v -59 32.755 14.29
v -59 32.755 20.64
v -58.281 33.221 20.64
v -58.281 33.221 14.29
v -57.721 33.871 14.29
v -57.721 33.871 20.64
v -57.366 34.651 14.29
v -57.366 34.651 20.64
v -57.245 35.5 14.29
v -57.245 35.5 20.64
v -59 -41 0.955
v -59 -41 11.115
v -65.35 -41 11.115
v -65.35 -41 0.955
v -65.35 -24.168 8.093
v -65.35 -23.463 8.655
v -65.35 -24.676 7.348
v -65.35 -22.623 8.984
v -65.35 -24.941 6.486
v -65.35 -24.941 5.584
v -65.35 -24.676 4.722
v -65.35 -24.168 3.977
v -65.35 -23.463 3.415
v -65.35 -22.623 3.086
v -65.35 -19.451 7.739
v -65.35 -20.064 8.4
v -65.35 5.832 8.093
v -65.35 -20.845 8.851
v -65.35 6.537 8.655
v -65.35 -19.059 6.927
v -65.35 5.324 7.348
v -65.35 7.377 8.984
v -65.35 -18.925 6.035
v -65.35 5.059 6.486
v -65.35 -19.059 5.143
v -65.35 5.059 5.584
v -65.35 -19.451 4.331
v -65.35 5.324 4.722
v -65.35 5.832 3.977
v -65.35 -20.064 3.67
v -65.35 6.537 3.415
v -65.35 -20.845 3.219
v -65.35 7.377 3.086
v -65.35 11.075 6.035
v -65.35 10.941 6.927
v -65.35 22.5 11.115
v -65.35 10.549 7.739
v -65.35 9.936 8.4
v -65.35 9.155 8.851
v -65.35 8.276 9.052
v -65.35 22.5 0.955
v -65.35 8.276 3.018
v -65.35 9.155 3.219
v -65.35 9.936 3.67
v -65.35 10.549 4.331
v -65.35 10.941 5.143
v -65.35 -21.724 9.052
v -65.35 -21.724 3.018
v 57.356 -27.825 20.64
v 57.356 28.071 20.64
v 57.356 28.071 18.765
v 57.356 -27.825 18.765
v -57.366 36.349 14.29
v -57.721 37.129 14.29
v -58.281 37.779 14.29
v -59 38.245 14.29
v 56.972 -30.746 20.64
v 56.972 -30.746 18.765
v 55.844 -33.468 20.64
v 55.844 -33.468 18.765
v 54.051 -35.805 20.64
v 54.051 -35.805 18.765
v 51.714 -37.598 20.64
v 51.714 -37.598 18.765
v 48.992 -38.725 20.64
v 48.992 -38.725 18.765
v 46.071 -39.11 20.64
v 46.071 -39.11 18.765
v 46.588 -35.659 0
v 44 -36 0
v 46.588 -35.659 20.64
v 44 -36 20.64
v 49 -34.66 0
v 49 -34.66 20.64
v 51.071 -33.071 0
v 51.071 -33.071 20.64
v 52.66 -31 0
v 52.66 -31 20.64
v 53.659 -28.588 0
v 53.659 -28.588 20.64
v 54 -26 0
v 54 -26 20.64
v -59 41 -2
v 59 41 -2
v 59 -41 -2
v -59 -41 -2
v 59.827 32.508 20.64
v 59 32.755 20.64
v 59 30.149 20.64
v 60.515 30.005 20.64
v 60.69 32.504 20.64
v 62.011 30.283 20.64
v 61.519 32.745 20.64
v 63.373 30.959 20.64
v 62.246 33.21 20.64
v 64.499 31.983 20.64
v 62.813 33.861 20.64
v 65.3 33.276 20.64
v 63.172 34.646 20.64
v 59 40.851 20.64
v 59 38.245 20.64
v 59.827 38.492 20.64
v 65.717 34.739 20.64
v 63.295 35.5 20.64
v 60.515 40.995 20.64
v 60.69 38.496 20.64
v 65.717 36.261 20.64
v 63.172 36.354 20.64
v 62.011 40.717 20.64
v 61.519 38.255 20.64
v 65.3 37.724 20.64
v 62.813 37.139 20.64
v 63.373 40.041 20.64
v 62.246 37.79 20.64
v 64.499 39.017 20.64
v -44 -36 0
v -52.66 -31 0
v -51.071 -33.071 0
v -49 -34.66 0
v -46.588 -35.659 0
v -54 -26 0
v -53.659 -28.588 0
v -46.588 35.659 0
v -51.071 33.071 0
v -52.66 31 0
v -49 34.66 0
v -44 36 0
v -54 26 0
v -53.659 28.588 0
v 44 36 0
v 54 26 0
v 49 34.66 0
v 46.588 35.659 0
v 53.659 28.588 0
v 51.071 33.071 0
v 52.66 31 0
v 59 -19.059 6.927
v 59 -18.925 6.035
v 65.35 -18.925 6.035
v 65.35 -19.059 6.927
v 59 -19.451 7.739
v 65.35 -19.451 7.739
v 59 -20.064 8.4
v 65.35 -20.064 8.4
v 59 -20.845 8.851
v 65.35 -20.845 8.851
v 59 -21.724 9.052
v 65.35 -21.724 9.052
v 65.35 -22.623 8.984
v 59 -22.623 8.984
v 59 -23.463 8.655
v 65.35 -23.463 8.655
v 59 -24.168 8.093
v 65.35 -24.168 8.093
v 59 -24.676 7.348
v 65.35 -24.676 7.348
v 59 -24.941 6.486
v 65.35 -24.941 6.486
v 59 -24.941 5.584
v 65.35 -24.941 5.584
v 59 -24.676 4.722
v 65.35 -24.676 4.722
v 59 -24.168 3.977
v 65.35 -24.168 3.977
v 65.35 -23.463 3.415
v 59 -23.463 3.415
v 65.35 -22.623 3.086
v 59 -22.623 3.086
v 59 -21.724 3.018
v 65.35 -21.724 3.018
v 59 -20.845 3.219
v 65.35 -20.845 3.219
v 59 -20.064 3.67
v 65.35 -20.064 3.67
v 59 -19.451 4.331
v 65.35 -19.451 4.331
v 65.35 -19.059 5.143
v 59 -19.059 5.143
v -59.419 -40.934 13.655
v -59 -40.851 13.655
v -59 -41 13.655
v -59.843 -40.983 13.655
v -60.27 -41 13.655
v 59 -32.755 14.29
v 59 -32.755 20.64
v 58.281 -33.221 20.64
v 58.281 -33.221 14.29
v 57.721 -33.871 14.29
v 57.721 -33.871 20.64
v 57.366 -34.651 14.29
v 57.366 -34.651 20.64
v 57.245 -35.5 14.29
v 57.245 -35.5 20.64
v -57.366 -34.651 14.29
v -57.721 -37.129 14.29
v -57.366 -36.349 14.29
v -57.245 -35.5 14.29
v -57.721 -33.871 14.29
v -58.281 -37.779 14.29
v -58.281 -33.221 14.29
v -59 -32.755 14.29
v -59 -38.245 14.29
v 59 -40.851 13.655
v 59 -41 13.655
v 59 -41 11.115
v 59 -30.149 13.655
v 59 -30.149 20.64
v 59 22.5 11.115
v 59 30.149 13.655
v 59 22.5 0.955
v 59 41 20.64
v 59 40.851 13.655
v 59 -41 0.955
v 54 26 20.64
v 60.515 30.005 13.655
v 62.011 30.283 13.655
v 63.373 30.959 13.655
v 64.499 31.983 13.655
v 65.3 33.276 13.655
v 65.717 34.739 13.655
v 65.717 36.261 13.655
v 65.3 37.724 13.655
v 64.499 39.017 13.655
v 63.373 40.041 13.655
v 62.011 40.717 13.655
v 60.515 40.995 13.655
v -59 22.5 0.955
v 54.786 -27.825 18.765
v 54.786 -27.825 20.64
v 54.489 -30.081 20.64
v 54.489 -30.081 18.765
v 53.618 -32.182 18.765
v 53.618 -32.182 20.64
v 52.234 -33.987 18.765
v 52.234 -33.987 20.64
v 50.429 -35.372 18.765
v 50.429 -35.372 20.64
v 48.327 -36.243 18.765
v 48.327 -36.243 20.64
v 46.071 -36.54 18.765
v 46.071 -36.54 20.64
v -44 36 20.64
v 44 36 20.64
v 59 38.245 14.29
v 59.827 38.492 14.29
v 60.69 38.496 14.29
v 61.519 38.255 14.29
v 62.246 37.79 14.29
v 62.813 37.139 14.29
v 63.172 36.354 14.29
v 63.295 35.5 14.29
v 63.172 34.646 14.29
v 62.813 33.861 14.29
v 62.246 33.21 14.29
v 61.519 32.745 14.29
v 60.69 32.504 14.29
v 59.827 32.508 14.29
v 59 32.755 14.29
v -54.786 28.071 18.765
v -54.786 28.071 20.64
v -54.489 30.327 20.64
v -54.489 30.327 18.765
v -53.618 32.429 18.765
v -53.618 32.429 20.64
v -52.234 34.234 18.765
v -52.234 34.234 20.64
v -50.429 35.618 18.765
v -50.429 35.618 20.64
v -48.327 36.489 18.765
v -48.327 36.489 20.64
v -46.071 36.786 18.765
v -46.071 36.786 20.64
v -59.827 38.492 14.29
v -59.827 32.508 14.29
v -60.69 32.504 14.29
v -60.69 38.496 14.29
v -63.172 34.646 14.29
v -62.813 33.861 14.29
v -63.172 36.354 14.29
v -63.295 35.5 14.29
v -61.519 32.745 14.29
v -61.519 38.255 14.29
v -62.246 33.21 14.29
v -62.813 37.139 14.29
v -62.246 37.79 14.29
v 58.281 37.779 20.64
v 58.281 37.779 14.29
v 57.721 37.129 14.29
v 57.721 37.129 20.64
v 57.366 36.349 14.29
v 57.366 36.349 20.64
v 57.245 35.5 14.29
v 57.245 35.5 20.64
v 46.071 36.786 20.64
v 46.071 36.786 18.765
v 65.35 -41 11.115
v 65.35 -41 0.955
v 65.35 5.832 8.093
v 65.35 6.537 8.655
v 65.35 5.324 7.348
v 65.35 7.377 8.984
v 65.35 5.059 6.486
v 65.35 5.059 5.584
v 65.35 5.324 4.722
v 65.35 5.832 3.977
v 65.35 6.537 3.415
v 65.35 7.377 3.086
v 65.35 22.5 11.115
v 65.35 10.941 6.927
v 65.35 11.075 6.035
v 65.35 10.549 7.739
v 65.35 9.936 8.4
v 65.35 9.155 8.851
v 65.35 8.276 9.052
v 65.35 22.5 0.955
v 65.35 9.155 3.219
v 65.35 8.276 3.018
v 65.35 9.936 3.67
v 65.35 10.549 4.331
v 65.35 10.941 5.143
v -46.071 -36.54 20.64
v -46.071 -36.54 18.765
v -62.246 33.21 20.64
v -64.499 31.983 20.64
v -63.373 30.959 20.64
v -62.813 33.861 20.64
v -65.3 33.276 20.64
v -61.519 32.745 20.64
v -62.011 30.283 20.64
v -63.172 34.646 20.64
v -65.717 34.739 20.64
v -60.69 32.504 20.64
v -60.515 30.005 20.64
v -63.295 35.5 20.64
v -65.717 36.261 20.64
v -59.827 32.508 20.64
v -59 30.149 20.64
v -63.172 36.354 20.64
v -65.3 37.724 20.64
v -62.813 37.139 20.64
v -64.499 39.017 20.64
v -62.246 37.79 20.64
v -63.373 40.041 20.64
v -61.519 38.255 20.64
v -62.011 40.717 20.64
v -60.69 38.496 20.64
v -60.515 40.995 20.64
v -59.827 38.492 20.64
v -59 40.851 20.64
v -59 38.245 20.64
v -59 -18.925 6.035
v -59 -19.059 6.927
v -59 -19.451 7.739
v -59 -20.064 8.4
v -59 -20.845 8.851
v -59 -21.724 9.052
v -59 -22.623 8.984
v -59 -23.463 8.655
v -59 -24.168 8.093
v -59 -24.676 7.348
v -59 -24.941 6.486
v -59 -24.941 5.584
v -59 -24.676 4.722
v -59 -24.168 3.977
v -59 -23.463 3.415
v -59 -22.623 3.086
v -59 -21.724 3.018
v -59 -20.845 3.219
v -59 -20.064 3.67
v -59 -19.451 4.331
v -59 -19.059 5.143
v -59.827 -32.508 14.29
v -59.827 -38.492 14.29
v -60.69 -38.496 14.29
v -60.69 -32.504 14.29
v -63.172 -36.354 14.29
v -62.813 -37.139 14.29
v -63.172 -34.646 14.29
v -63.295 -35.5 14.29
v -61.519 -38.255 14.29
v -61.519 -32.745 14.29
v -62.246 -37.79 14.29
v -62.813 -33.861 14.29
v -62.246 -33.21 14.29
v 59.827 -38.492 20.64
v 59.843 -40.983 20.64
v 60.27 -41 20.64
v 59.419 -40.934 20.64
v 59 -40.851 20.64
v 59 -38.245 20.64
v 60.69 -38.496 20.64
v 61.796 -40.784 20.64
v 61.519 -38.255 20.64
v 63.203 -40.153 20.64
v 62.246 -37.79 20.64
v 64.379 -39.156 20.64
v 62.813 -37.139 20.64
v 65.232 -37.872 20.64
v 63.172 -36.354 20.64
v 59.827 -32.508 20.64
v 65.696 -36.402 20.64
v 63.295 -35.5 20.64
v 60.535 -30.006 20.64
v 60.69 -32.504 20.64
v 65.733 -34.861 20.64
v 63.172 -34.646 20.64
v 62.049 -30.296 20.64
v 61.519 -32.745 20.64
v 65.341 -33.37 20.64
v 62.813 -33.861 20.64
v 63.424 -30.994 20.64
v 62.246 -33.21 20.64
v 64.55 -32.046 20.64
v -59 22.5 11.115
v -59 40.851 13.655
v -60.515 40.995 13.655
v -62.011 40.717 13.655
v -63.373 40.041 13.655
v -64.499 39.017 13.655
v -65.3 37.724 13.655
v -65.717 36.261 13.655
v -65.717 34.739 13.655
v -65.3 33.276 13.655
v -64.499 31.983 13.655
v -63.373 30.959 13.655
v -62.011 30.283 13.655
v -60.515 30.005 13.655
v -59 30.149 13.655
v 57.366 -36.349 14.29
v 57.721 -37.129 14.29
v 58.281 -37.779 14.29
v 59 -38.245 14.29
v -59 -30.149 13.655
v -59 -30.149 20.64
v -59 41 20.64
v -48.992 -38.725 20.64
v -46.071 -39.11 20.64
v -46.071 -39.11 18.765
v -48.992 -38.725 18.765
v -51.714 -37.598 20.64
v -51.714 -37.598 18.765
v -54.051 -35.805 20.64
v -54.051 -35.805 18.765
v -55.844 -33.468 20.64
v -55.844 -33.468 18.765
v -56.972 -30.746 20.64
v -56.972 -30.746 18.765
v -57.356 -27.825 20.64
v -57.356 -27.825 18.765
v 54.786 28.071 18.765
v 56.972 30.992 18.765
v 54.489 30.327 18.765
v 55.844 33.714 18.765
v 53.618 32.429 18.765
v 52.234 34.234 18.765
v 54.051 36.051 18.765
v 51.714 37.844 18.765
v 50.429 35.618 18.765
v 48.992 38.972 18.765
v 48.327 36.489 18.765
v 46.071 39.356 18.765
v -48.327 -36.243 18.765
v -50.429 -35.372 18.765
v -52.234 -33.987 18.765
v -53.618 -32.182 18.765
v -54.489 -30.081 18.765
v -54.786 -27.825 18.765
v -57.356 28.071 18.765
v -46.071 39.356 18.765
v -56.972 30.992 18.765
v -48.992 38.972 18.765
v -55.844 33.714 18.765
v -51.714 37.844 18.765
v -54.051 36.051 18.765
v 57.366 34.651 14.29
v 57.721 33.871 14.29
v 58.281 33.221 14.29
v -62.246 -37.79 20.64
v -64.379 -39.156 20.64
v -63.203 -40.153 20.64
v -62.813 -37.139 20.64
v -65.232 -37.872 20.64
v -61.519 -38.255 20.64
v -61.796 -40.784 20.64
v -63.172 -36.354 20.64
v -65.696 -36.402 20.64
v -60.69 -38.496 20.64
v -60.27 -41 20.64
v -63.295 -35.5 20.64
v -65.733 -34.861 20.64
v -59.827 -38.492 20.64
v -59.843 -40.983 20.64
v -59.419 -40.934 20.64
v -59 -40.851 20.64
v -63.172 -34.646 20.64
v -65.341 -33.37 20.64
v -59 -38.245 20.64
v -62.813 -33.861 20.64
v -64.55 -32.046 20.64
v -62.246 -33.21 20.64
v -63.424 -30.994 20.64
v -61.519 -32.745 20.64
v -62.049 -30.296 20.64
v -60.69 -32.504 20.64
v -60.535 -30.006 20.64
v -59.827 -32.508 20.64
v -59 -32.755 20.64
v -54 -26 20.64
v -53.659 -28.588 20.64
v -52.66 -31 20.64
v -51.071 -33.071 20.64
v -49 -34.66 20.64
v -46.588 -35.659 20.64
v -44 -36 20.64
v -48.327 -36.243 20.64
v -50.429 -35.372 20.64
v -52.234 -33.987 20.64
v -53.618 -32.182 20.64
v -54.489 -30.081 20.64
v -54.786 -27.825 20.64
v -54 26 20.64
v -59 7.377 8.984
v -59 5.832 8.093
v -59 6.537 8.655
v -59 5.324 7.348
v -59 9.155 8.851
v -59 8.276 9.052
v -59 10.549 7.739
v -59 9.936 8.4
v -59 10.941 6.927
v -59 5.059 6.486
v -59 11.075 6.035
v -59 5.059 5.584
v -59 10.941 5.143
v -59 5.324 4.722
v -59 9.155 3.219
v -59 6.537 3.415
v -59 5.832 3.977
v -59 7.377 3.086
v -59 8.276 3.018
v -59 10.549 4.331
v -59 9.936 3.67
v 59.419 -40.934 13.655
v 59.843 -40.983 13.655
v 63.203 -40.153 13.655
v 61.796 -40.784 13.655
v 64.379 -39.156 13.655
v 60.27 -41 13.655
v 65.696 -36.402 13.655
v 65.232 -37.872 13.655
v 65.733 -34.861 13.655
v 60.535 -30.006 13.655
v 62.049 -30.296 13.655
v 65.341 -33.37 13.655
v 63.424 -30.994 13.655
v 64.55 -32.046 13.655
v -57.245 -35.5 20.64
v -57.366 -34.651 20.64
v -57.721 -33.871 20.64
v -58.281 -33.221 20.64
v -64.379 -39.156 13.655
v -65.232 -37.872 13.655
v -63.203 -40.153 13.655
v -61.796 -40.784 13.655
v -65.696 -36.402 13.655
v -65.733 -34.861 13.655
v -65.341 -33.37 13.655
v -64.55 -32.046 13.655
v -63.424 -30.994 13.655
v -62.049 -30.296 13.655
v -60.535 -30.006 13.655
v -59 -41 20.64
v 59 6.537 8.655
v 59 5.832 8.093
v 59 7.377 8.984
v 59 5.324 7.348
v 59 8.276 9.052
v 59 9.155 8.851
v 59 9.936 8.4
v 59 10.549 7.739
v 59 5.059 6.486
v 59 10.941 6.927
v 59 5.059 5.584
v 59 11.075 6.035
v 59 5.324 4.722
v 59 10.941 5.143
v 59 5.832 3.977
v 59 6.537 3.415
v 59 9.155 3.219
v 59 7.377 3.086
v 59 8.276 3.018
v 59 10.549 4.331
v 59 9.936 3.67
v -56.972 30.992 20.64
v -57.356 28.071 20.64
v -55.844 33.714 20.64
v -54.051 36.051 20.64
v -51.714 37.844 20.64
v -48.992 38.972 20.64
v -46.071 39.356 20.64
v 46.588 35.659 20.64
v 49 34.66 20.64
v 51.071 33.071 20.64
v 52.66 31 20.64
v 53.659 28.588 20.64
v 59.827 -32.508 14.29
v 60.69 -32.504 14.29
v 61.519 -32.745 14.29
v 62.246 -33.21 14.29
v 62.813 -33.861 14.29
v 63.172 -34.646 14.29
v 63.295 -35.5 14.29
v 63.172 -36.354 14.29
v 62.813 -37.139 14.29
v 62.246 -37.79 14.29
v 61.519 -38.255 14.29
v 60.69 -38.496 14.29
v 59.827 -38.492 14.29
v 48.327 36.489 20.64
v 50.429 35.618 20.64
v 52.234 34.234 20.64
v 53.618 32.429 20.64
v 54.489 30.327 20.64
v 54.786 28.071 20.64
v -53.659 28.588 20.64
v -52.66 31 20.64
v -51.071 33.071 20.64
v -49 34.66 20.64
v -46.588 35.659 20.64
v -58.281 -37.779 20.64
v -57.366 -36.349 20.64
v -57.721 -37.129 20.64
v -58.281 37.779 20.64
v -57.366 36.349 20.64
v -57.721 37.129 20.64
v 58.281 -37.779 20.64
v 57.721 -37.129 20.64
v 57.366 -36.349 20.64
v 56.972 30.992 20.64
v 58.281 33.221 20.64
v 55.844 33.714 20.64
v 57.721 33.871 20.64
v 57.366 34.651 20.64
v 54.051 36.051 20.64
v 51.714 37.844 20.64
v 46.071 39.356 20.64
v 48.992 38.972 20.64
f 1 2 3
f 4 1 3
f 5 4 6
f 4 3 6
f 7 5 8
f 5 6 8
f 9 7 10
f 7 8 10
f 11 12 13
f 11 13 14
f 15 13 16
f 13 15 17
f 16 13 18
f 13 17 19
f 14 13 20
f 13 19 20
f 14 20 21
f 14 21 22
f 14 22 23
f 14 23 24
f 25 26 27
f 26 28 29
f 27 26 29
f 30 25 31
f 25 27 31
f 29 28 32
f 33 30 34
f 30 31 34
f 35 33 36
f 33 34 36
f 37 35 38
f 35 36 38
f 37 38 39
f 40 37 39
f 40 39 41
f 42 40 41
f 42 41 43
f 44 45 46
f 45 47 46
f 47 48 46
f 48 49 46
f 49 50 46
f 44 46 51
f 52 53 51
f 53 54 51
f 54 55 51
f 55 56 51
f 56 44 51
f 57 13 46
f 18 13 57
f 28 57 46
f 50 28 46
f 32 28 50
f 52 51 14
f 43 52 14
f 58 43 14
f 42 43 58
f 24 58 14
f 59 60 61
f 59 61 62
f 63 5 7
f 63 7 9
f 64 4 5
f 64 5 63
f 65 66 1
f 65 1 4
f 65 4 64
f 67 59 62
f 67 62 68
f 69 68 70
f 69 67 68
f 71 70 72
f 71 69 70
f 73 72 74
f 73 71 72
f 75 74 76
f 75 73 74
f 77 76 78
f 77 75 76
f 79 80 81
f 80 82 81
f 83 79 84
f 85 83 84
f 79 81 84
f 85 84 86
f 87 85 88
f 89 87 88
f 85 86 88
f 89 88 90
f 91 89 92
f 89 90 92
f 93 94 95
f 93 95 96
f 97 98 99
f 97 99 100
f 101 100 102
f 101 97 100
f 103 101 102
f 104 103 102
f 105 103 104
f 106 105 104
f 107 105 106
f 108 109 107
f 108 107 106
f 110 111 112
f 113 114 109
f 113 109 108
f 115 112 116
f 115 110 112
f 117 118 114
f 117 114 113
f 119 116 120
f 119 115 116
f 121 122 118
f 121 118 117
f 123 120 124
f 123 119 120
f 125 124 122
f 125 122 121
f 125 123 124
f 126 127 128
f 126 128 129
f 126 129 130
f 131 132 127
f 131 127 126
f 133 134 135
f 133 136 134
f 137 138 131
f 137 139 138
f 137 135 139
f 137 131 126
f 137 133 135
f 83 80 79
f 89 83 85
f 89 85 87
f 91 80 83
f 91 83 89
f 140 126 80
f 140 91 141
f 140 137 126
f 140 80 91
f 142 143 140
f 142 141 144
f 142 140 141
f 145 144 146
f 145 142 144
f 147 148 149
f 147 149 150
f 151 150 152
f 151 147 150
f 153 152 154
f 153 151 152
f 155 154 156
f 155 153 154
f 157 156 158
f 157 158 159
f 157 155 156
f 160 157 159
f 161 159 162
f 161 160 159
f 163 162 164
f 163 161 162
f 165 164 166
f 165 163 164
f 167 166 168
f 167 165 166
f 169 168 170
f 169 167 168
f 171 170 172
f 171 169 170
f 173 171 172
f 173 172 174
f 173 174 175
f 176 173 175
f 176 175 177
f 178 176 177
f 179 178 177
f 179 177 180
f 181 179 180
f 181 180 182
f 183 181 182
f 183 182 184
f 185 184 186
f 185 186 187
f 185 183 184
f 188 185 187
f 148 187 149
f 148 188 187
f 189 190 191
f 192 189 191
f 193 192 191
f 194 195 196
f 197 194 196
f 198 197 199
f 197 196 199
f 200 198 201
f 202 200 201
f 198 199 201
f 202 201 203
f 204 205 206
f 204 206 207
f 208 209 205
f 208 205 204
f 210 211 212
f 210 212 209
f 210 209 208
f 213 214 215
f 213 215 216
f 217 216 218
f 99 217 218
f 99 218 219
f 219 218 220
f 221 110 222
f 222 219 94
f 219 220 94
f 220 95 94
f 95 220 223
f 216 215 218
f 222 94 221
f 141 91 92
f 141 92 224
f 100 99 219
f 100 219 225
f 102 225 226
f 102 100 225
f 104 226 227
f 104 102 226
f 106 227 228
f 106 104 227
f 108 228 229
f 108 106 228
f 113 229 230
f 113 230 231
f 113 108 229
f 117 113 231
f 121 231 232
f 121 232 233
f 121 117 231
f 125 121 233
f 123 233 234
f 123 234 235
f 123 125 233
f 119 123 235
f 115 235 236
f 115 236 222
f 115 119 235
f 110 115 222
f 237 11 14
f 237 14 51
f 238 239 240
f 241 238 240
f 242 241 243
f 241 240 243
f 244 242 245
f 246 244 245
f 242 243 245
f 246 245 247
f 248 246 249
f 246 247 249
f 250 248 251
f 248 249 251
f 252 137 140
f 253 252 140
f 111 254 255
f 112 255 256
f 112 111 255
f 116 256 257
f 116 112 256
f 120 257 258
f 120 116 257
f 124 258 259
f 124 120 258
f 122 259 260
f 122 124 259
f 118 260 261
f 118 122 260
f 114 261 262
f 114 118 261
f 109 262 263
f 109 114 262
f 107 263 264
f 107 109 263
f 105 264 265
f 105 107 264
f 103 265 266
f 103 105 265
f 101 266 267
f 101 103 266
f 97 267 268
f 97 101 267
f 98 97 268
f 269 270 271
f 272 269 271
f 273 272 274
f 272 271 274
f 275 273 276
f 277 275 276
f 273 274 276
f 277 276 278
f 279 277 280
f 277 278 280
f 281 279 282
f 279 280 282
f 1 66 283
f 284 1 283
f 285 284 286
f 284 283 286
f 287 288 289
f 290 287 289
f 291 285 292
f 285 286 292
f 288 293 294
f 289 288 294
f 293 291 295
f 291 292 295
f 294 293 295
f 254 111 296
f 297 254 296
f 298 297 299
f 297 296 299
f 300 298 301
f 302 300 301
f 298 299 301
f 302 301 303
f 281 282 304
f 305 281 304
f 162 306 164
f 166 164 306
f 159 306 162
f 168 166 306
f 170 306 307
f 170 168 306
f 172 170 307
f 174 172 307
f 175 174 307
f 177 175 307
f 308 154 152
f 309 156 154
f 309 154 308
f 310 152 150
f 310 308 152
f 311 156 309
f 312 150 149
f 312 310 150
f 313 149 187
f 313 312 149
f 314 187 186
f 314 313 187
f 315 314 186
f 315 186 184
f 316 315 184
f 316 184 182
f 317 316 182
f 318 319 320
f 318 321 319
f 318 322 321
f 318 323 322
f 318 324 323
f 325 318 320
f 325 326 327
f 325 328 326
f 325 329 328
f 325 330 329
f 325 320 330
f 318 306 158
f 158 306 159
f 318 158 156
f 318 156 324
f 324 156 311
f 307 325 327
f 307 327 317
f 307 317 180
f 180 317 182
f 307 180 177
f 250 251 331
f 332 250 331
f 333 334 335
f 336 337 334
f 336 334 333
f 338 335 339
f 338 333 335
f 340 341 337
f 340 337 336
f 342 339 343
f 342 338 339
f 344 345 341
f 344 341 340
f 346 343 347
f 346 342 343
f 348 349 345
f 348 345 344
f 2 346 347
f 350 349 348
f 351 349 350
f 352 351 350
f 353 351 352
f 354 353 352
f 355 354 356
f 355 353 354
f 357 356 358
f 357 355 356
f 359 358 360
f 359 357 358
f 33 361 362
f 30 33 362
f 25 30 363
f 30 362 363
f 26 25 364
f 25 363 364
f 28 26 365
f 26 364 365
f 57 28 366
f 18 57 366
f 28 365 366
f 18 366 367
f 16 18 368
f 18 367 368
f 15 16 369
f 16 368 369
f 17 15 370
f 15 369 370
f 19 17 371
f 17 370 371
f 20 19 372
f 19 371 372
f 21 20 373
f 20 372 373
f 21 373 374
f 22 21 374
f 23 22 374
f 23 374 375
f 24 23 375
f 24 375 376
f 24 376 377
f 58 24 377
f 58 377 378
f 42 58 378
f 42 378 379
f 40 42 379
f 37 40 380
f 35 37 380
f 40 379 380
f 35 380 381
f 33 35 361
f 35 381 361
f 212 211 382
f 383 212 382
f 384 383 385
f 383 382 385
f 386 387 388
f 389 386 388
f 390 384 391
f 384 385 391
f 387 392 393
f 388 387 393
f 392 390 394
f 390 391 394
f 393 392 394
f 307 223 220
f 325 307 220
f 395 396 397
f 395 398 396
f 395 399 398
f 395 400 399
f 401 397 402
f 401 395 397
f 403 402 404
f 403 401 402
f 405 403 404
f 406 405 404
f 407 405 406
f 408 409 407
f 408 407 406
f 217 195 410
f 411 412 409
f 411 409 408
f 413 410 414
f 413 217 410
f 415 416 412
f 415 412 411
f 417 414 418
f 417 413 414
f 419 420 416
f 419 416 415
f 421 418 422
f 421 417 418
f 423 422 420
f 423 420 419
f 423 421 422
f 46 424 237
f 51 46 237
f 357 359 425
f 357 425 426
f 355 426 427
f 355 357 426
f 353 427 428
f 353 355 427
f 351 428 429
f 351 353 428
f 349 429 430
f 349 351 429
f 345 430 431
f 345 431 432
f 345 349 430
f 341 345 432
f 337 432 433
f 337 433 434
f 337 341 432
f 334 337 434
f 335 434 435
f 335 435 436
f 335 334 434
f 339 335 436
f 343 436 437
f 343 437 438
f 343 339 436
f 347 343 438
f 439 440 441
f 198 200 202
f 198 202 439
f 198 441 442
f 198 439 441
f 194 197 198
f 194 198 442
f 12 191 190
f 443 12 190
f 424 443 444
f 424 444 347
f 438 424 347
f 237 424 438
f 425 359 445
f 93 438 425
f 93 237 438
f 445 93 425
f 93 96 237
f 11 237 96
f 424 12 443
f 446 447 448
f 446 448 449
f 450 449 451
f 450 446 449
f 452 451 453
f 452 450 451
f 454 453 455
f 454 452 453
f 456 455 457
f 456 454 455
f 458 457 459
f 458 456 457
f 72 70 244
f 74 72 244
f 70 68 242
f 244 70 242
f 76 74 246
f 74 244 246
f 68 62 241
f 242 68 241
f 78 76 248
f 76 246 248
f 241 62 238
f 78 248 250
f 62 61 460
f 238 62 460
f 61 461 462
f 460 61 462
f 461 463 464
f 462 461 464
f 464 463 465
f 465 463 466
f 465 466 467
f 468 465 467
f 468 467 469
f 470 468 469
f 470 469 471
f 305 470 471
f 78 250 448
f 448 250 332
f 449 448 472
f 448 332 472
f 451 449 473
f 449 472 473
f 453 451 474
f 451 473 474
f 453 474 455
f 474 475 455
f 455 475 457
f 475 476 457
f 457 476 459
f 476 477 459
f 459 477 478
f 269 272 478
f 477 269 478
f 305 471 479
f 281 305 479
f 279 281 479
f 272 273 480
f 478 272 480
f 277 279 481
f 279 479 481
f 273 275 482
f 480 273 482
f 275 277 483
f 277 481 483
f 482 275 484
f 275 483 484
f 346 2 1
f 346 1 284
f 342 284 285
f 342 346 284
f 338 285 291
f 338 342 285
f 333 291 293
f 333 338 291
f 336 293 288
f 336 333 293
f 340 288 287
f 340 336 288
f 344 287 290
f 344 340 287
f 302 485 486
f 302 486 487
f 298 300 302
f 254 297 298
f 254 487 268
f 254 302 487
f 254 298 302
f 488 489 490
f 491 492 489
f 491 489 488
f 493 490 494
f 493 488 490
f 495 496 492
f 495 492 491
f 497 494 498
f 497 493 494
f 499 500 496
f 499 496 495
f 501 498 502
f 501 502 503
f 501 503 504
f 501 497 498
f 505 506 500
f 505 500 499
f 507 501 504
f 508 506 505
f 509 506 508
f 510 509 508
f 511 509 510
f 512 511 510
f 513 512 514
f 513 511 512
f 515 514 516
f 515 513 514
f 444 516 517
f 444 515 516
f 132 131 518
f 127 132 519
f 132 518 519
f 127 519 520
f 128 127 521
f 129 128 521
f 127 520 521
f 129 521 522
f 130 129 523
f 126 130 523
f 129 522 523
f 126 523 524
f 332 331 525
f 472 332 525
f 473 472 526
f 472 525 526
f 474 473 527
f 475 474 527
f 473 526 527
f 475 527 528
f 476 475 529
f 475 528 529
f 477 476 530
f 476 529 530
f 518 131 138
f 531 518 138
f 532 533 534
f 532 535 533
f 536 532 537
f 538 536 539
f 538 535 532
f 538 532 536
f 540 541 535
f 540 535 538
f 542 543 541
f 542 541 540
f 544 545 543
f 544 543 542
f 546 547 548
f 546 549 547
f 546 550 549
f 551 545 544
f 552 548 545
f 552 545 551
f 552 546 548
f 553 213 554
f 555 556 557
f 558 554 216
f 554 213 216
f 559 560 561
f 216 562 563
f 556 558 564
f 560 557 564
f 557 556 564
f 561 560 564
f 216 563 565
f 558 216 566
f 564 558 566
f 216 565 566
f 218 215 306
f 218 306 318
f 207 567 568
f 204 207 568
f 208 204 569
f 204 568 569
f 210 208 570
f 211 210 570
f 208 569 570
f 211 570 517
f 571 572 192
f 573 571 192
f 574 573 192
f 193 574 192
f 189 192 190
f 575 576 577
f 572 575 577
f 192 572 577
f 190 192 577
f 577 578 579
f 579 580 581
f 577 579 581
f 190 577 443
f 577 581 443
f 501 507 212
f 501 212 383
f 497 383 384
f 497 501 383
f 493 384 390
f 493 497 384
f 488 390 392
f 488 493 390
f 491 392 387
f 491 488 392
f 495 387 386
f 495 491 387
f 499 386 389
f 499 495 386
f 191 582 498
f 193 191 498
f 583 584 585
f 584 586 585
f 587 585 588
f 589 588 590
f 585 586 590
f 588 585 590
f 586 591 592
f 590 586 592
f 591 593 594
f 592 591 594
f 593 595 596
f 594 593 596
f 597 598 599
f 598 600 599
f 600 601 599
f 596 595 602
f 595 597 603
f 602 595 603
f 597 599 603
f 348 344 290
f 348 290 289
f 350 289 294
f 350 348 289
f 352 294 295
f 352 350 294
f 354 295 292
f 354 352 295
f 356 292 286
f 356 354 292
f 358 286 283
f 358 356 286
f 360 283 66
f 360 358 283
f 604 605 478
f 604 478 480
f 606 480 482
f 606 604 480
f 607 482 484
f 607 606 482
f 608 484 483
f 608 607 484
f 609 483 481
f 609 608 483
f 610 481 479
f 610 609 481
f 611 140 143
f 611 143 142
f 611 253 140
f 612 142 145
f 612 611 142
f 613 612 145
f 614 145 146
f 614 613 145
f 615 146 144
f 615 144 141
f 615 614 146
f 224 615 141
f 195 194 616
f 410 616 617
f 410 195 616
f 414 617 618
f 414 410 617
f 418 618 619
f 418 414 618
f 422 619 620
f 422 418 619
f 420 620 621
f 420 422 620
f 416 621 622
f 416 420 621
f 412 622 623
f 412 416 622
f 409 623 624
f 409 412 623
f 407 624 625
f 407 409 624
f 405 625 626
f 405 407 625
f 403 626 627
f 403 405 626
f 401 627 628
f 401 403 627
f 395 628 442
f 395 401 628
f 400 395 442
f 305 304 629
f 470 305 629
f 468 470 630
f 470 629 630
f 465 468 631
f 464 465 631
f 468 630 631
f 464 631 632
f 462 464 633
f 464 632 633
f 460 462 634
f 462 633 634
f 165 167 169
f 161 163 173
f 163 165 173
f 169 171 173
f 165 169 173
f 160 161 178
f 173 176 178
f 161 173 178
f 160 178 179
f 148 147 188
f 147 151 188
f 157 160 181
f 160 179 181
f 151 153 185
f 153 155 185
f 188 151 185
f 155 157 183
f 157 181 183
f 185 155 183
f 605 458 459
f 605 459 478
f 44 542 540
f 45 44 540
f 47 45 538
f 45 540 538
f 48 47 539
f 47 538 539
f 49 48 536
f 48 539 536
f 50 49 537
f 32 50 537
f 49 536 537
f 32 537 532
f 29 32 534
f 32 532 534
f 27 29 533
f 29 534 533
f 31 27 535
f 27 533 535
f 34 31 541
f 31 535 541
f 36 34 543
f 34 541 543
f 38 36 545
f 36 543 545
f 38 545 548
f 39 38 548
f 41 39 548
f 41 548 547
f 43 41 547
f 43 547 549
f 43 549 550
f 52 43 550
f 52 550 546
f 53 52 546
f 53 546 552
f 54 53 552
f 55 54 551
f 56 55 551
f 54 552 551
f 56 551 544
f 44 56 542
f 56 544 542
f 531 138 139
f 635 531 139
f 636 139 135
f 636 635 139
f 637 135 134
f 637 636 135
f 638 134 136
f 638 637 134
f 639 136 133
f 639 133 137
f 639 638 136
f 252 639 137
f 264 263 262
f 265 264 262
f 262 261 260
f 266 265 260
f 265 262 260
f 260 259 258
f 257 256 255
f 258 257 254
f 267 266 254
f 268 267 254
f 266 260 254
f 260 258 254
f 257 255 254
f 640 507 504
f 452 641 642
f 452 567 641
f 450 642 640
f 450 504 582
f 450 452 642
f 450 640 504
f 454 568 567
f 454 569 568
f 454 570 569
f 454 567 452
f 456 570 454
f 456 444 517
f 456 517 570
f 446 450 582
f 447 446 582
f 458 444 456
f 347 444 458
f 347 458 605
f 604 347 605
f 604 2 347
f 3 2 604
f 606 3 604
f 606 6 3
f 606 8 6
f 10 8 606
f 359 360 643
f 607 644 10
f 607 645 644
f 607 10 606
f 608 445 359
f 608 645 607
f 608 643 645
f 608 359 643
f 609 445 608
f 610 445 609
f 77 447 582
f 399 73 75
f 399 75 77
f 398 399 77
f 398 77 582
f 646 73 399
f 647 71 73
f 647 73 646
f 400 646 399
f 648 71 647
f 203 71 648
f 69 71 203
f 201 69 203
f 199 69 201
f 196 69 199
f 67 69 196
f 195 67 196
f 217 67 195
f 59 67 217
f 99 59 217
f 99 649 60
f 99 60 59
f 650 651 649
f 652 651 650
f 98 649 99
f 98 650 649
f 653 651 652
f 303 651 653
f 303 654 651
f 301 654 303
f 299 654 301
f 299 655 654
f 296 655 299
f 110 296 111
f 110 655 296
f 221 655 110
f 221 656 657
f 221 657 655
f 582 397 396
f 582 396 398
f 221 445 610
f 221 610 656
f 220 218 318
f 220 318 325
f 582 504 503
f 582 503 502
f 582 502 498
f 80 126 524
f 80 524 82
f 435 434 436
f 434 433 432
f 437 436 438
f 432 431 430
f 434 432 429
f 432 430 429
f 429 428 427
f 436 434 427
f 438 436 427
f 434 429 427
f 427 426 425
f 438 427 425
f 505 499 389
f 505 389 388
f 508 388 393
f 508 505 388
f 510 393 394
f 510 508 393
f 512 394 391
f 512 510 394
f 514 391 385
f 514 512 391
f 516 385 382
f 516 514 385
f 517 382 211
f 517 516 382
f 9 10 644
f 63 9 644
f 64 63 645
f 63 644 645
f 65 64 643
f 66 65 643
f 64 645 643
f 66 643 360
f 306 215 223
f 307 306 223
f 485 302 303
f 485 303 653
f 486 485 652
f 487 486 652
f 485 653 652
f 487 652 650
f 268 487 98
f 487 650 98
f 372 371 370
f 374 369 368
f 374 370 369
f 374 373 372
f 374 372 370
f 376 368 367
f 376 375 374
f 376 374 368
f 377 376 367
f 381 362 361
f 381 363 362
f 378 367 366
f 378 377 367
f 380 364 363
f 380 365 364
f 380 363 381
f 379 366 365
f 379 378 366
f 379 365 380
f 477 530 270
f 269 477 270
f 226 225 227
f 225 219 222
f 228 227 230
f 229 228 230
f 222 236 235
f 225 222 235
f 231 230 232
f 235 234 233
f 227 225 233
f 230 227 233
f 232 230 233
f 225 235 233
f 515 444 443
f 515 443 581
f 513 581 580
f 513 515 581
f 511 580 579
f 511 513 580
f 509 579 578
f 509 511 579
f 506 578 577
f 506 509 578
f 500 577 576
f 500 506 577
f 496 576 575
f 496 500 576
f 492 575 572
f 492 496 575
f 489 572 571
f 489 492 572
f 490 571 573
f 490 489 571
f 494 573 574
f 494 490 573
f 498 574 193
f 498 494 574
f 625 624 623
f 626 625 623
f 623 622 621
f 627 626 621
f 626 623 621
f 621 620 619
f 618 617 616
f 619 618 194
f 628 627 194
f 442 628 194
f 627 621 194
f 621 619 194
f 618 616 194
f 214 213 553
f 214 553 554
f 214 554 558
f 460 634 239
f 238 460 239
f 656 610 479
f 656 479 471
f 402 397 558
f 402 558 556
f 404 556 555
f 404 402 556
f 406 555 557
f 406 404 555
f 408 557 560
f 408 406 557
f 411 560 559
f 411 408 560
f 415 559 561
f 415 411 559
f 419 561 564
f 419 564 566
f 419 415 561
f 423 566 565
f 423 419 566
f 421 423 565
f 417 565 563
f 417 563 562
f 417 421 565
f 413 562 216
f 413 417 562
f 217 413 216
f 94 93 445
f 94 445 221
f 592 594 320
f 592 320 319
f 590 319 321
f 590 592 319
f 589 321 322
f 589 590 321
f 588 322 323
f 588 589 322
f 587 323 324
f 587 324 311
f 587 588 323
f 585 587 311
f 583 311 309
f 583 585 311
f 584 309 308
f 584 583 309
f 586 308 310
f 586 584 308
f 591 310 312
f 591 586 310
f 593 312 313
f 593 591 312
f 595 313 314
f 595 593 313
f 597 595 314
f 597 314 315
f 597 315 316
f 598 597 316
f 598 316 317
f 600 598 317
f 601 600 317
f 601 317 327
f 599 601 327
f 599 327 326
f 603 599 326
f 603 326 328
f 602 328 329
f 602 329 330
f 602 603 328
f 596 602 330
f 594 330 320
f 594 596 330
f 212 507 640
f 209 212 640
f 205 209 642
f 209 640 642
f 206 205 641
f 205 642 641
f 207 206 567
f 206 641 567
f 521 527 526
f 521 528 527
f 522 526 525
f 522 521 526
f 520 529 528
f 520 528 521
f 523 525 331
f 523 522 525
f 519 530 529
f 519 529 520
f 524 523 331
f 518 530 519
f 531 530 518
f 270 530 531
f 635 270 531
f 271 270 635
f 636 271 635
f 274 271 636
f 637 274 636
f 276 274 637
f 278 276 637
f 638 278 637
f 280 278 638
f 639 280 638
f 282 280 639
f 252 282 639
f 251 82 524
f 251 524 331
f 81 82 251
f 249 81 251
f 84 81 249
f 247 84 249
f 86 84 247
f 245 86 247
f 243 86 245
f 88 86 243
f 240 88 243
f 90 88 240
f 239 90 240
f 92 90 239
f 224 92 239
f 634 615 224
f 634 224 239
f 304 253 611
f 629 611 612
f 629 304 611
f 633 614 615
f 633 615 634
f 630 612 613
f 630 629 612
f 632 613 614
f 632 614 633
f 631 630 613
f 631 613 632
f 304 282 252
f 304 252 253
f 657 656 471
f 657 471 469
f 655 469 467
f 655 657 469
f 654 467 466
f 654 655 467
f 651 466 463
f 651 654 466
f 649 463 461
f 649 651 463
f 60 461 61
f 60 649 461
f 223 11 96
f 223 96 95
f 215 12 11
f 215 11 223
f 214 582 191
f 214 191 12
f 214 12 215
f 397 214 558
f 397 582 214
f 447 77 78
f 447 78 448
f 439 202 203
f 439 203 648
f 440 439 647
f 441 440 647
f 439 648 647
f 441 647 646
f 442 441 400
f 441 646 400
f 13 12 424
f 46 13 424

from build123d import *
from build123d.topology import SkipClean

# Parameters (mm, degrees)
SKETCH2_W           = 108
SKETCH2_H           = 72
BOSS_EXTRUDE1_DEPTH = 20.64
SHELL1_T            = 5
SKETCH3_W           = 118
SKETCH3_H           = 82
CUT_EXTRUDE1_DEPTH  = 3
FILLET1_R           = 10
BOSS_EXTRUDE2_DEPTH = 6.985
SKETCH6_4_R         = 3.025
CUT_EXTRUDE4_DEPTH  = 6.35
CUT_EXTRUDE2_DEPTH  = 1.875
SKETCH14_W          = 10.16
SKETCH14_H          = 63.5
SKETCH14_R          = 3.02514
BOSS_EXTRUDE5_DEPTH = 6.35


with BuildPart() as part:
    # Sketch2 → Boss-Extrude1 (new body)
    with BuildSketch(Plane.XY):
        Rectangle(SKETCH2_W, SKETCH2_H)
    extrude(amount=BOSS_EXTRUDE1_DEPTH)

    # Shell1
    shell1_openings = [part.faces().sort_by_distance(p)[0] for p in [
        (0, 0, 20.64),
    ]]
    offset(amount=SHELL1_T, openings=shell1_openings, kind=Kind.INTERSECTION)

    # Sketch3 → Cut-Extrude1 (cut)
    with BuildSketch(Plane(origin=(0, 0, -5), x_dir=(-1, 0, 0), z_dir=(0, 0, -1))):
        Rectangle(SKETCH3_W, SKETCH3_H)
    extrude(amount=-CUT_EXTRUDE1_DEPTH, mode=Mode.SUBTRACT)

    # Fillet1
    fillet1_edges = [part.edges().sort_by_distance(p)[0] for p in [
        (54, -36, 10.32),
        (-54, -36, 10.32),
        (54, 36, 10.32),
        (-54, 36, 10.32),
    ]]
    fillet(fillet1_edges, radius=FILLET1_R)

    # Sketch6 → Boss-Extrude2 (add)
    with BuildSketch(Plane.XY.offset(20.64)):
        with BuildLine():
            ThreePointArc((59, 30.148635688), (65.77, 35.5), (59, 40.851364312))
            Line((59, 40.851364312), (59, 30.148635688))
        make_face()
        with BuildLine():
            Line((59, -41), (60.27, -41))
            ThreePointArc((60.27, -41), (65.732714697, -34.86066586), (59, -30.148635688))
            Line((59, -30.148635688), (59, -32.754508241))
            ThreePointArc((59, -32.754508241), (57.245, -35.5), (59, -38.245491759))
            Line((59, -38.245491759), (59, -41))
        make_face()
        with BuildLine():
            ThreePointArc((-59, -38.245491759), (-57.245, -35.5), (-59, -32.754508241))
            Line((-59, -32.754508241), (-59, -30.148635688))
            ThreePointArc((-59, -30.148635688), (-65.77, -35.5), (-59, -40.851364312))
            Line((-59, -40.851364312), (-59, -38.245491759))
        make_face()
        with BuildLine():
            ThreePointArc((-59, 40.851364312), (-65.77, 35.5), (-59, 30.148635688))
            Line((-59, 30.148635688), (-59, 40.851364312))
        make_face()
    boss_extrude2 = extrude(amount=-BOSS_EXTRUDE2_DEPTH)

    # Sketch6<4> → Cut-Extrude4 (cut)
    with BuildSketch(Plane.XY.offset(20.64)):
        with Locations((60.27, -35.5)):
            Circle(SKETCH6_4_R)
        with Locations((60.27, 35.5)):
            Circle(SKETCH6_4_R)
        with Locations((-60.27, -35.5)):
            Circle(SKETCH6_4_R)
        with Locations((-60.27, 35.5)):
            Circle(SKETCH6_4_R)
    cut_extrude4 = extrude(amount=-CUT_EXTRUDE4_DEPTH, mode=Mode.SUBTRACT)

    # Mirror5: Boss-Extrude2, Cut-Extrude4 across plane
    with SkipClean():  # the faces are left unmerged after this step: merging them gives an invalid solid
        add(boss_extrude2.mirror(Plane(origin=(0, 0, 0), x_dir=(0, 0, 1), z_dir=(1, 0, 0))))
        add(cut_extrude4.mirror(Plane(origin=(0, 0, 0), x_dir=(0, 0, 1), z_dir=(1, 0, 0))), mode=Mode.SUBTRACT)
    add(part.part.scale(1), mode=Mode.REPLACE)  # the faces are merged on a copy

    # Sketch5 → Cut-Extrude2 (cut)
    with BuildSketch(Plane.XY.offset(20.64)):
        with BuildLine():
            Line((46.071067812, -39.11), (-46.071067812, -39.11))
            ThreePointArc((-46.071067812, -39.11), (-54.050767838, -35.804700026), (-57.356067812, -27.825))
            Line((-57.356067812, -27.825), (-57.356067812, 28.071067812))
            ThreePointArc((-57.356067812, 28.071067812), (-54.050767838, 36.050767838), (-46.071067812, 39.356067812))
            Line((-46.071067812, 39.356067812), (46.071067812, 39.356067812))
            ThreePointArc((46.071067812, 39.356067812), (54.050767838, 36.050767838), (57.356067812, 28.071067812))
            Line((57.356067812, 28.071067812), (57.356067812, -27.825))
            ThreePointArc((57.356067812, -27.825), (54.050767838, -35.804700026), (46.071067812, -39.11))
        make_face()
        with BuildLine():
            Line((46.071067812, -36.54), (-46.071067812, -36.54))
            ThreePointArc((-46.071067812, -36.54), (-52.23350341, -33.987435598), (-54.786067812, -27.825))
            Line((-54.786067812, -27.825), (-54.786067812, 28.071067812))
            ThreePointArc((-54.786067812, 28.071067812), (-52.23350341, 34.23350341), (-46.071067812, 36.786067812))
            Line((-46.071067812, 36.786067812), (46.071067812, 36.786067812))
            ThreePointArc((46.071067812, 36.786067812), (52.23350341, 34.23350341), (54.786067812, 28.071067812))
            Line((54.786067812, 28.071067812), (54.786067812, -27.825))
            ThreePointArc((54.786067812, -27.825), (52.23350341, -33.987435598), (46.071067812, -36.54))
        make_face(mode=Mode.SUBTRACT)
    extrude(amount=-CUT_EXTRUDE2_DEPTH, mode=Mode.SUBTRACT)

    # Sketch14 → Boss-Extrude5 (add)
    with BuildSketch(Plane(origin=(59, 0, 0), x_dir=(0, 0, -1), z_dir=(1, 0, 0))):
        with Locations((-6.035, -9.25)):
            Rectangle(SKETCH14_W, SKETCH14_H)
        with Locations((-6.035, 8.04994)):
            Circle(SKETCH14_R, mode=Mode.SUBTRACT)
        with Locations((-6.035, -21.95)):
            Circle(SKETCH14_R, mode=Mode.SUBTRACT)
    boss_extrude5 = extrude(amount=BOSS_EXTRUDE5_DEPTH)

    # Mirror6: Boss-Extrude5 across plane
    add(boss_extrude5.mirror(Plane(origin=(0, 0, 0), x_dir=(0, 0, 1), z_dir=(1, 0, 0))))


solid = part.part
